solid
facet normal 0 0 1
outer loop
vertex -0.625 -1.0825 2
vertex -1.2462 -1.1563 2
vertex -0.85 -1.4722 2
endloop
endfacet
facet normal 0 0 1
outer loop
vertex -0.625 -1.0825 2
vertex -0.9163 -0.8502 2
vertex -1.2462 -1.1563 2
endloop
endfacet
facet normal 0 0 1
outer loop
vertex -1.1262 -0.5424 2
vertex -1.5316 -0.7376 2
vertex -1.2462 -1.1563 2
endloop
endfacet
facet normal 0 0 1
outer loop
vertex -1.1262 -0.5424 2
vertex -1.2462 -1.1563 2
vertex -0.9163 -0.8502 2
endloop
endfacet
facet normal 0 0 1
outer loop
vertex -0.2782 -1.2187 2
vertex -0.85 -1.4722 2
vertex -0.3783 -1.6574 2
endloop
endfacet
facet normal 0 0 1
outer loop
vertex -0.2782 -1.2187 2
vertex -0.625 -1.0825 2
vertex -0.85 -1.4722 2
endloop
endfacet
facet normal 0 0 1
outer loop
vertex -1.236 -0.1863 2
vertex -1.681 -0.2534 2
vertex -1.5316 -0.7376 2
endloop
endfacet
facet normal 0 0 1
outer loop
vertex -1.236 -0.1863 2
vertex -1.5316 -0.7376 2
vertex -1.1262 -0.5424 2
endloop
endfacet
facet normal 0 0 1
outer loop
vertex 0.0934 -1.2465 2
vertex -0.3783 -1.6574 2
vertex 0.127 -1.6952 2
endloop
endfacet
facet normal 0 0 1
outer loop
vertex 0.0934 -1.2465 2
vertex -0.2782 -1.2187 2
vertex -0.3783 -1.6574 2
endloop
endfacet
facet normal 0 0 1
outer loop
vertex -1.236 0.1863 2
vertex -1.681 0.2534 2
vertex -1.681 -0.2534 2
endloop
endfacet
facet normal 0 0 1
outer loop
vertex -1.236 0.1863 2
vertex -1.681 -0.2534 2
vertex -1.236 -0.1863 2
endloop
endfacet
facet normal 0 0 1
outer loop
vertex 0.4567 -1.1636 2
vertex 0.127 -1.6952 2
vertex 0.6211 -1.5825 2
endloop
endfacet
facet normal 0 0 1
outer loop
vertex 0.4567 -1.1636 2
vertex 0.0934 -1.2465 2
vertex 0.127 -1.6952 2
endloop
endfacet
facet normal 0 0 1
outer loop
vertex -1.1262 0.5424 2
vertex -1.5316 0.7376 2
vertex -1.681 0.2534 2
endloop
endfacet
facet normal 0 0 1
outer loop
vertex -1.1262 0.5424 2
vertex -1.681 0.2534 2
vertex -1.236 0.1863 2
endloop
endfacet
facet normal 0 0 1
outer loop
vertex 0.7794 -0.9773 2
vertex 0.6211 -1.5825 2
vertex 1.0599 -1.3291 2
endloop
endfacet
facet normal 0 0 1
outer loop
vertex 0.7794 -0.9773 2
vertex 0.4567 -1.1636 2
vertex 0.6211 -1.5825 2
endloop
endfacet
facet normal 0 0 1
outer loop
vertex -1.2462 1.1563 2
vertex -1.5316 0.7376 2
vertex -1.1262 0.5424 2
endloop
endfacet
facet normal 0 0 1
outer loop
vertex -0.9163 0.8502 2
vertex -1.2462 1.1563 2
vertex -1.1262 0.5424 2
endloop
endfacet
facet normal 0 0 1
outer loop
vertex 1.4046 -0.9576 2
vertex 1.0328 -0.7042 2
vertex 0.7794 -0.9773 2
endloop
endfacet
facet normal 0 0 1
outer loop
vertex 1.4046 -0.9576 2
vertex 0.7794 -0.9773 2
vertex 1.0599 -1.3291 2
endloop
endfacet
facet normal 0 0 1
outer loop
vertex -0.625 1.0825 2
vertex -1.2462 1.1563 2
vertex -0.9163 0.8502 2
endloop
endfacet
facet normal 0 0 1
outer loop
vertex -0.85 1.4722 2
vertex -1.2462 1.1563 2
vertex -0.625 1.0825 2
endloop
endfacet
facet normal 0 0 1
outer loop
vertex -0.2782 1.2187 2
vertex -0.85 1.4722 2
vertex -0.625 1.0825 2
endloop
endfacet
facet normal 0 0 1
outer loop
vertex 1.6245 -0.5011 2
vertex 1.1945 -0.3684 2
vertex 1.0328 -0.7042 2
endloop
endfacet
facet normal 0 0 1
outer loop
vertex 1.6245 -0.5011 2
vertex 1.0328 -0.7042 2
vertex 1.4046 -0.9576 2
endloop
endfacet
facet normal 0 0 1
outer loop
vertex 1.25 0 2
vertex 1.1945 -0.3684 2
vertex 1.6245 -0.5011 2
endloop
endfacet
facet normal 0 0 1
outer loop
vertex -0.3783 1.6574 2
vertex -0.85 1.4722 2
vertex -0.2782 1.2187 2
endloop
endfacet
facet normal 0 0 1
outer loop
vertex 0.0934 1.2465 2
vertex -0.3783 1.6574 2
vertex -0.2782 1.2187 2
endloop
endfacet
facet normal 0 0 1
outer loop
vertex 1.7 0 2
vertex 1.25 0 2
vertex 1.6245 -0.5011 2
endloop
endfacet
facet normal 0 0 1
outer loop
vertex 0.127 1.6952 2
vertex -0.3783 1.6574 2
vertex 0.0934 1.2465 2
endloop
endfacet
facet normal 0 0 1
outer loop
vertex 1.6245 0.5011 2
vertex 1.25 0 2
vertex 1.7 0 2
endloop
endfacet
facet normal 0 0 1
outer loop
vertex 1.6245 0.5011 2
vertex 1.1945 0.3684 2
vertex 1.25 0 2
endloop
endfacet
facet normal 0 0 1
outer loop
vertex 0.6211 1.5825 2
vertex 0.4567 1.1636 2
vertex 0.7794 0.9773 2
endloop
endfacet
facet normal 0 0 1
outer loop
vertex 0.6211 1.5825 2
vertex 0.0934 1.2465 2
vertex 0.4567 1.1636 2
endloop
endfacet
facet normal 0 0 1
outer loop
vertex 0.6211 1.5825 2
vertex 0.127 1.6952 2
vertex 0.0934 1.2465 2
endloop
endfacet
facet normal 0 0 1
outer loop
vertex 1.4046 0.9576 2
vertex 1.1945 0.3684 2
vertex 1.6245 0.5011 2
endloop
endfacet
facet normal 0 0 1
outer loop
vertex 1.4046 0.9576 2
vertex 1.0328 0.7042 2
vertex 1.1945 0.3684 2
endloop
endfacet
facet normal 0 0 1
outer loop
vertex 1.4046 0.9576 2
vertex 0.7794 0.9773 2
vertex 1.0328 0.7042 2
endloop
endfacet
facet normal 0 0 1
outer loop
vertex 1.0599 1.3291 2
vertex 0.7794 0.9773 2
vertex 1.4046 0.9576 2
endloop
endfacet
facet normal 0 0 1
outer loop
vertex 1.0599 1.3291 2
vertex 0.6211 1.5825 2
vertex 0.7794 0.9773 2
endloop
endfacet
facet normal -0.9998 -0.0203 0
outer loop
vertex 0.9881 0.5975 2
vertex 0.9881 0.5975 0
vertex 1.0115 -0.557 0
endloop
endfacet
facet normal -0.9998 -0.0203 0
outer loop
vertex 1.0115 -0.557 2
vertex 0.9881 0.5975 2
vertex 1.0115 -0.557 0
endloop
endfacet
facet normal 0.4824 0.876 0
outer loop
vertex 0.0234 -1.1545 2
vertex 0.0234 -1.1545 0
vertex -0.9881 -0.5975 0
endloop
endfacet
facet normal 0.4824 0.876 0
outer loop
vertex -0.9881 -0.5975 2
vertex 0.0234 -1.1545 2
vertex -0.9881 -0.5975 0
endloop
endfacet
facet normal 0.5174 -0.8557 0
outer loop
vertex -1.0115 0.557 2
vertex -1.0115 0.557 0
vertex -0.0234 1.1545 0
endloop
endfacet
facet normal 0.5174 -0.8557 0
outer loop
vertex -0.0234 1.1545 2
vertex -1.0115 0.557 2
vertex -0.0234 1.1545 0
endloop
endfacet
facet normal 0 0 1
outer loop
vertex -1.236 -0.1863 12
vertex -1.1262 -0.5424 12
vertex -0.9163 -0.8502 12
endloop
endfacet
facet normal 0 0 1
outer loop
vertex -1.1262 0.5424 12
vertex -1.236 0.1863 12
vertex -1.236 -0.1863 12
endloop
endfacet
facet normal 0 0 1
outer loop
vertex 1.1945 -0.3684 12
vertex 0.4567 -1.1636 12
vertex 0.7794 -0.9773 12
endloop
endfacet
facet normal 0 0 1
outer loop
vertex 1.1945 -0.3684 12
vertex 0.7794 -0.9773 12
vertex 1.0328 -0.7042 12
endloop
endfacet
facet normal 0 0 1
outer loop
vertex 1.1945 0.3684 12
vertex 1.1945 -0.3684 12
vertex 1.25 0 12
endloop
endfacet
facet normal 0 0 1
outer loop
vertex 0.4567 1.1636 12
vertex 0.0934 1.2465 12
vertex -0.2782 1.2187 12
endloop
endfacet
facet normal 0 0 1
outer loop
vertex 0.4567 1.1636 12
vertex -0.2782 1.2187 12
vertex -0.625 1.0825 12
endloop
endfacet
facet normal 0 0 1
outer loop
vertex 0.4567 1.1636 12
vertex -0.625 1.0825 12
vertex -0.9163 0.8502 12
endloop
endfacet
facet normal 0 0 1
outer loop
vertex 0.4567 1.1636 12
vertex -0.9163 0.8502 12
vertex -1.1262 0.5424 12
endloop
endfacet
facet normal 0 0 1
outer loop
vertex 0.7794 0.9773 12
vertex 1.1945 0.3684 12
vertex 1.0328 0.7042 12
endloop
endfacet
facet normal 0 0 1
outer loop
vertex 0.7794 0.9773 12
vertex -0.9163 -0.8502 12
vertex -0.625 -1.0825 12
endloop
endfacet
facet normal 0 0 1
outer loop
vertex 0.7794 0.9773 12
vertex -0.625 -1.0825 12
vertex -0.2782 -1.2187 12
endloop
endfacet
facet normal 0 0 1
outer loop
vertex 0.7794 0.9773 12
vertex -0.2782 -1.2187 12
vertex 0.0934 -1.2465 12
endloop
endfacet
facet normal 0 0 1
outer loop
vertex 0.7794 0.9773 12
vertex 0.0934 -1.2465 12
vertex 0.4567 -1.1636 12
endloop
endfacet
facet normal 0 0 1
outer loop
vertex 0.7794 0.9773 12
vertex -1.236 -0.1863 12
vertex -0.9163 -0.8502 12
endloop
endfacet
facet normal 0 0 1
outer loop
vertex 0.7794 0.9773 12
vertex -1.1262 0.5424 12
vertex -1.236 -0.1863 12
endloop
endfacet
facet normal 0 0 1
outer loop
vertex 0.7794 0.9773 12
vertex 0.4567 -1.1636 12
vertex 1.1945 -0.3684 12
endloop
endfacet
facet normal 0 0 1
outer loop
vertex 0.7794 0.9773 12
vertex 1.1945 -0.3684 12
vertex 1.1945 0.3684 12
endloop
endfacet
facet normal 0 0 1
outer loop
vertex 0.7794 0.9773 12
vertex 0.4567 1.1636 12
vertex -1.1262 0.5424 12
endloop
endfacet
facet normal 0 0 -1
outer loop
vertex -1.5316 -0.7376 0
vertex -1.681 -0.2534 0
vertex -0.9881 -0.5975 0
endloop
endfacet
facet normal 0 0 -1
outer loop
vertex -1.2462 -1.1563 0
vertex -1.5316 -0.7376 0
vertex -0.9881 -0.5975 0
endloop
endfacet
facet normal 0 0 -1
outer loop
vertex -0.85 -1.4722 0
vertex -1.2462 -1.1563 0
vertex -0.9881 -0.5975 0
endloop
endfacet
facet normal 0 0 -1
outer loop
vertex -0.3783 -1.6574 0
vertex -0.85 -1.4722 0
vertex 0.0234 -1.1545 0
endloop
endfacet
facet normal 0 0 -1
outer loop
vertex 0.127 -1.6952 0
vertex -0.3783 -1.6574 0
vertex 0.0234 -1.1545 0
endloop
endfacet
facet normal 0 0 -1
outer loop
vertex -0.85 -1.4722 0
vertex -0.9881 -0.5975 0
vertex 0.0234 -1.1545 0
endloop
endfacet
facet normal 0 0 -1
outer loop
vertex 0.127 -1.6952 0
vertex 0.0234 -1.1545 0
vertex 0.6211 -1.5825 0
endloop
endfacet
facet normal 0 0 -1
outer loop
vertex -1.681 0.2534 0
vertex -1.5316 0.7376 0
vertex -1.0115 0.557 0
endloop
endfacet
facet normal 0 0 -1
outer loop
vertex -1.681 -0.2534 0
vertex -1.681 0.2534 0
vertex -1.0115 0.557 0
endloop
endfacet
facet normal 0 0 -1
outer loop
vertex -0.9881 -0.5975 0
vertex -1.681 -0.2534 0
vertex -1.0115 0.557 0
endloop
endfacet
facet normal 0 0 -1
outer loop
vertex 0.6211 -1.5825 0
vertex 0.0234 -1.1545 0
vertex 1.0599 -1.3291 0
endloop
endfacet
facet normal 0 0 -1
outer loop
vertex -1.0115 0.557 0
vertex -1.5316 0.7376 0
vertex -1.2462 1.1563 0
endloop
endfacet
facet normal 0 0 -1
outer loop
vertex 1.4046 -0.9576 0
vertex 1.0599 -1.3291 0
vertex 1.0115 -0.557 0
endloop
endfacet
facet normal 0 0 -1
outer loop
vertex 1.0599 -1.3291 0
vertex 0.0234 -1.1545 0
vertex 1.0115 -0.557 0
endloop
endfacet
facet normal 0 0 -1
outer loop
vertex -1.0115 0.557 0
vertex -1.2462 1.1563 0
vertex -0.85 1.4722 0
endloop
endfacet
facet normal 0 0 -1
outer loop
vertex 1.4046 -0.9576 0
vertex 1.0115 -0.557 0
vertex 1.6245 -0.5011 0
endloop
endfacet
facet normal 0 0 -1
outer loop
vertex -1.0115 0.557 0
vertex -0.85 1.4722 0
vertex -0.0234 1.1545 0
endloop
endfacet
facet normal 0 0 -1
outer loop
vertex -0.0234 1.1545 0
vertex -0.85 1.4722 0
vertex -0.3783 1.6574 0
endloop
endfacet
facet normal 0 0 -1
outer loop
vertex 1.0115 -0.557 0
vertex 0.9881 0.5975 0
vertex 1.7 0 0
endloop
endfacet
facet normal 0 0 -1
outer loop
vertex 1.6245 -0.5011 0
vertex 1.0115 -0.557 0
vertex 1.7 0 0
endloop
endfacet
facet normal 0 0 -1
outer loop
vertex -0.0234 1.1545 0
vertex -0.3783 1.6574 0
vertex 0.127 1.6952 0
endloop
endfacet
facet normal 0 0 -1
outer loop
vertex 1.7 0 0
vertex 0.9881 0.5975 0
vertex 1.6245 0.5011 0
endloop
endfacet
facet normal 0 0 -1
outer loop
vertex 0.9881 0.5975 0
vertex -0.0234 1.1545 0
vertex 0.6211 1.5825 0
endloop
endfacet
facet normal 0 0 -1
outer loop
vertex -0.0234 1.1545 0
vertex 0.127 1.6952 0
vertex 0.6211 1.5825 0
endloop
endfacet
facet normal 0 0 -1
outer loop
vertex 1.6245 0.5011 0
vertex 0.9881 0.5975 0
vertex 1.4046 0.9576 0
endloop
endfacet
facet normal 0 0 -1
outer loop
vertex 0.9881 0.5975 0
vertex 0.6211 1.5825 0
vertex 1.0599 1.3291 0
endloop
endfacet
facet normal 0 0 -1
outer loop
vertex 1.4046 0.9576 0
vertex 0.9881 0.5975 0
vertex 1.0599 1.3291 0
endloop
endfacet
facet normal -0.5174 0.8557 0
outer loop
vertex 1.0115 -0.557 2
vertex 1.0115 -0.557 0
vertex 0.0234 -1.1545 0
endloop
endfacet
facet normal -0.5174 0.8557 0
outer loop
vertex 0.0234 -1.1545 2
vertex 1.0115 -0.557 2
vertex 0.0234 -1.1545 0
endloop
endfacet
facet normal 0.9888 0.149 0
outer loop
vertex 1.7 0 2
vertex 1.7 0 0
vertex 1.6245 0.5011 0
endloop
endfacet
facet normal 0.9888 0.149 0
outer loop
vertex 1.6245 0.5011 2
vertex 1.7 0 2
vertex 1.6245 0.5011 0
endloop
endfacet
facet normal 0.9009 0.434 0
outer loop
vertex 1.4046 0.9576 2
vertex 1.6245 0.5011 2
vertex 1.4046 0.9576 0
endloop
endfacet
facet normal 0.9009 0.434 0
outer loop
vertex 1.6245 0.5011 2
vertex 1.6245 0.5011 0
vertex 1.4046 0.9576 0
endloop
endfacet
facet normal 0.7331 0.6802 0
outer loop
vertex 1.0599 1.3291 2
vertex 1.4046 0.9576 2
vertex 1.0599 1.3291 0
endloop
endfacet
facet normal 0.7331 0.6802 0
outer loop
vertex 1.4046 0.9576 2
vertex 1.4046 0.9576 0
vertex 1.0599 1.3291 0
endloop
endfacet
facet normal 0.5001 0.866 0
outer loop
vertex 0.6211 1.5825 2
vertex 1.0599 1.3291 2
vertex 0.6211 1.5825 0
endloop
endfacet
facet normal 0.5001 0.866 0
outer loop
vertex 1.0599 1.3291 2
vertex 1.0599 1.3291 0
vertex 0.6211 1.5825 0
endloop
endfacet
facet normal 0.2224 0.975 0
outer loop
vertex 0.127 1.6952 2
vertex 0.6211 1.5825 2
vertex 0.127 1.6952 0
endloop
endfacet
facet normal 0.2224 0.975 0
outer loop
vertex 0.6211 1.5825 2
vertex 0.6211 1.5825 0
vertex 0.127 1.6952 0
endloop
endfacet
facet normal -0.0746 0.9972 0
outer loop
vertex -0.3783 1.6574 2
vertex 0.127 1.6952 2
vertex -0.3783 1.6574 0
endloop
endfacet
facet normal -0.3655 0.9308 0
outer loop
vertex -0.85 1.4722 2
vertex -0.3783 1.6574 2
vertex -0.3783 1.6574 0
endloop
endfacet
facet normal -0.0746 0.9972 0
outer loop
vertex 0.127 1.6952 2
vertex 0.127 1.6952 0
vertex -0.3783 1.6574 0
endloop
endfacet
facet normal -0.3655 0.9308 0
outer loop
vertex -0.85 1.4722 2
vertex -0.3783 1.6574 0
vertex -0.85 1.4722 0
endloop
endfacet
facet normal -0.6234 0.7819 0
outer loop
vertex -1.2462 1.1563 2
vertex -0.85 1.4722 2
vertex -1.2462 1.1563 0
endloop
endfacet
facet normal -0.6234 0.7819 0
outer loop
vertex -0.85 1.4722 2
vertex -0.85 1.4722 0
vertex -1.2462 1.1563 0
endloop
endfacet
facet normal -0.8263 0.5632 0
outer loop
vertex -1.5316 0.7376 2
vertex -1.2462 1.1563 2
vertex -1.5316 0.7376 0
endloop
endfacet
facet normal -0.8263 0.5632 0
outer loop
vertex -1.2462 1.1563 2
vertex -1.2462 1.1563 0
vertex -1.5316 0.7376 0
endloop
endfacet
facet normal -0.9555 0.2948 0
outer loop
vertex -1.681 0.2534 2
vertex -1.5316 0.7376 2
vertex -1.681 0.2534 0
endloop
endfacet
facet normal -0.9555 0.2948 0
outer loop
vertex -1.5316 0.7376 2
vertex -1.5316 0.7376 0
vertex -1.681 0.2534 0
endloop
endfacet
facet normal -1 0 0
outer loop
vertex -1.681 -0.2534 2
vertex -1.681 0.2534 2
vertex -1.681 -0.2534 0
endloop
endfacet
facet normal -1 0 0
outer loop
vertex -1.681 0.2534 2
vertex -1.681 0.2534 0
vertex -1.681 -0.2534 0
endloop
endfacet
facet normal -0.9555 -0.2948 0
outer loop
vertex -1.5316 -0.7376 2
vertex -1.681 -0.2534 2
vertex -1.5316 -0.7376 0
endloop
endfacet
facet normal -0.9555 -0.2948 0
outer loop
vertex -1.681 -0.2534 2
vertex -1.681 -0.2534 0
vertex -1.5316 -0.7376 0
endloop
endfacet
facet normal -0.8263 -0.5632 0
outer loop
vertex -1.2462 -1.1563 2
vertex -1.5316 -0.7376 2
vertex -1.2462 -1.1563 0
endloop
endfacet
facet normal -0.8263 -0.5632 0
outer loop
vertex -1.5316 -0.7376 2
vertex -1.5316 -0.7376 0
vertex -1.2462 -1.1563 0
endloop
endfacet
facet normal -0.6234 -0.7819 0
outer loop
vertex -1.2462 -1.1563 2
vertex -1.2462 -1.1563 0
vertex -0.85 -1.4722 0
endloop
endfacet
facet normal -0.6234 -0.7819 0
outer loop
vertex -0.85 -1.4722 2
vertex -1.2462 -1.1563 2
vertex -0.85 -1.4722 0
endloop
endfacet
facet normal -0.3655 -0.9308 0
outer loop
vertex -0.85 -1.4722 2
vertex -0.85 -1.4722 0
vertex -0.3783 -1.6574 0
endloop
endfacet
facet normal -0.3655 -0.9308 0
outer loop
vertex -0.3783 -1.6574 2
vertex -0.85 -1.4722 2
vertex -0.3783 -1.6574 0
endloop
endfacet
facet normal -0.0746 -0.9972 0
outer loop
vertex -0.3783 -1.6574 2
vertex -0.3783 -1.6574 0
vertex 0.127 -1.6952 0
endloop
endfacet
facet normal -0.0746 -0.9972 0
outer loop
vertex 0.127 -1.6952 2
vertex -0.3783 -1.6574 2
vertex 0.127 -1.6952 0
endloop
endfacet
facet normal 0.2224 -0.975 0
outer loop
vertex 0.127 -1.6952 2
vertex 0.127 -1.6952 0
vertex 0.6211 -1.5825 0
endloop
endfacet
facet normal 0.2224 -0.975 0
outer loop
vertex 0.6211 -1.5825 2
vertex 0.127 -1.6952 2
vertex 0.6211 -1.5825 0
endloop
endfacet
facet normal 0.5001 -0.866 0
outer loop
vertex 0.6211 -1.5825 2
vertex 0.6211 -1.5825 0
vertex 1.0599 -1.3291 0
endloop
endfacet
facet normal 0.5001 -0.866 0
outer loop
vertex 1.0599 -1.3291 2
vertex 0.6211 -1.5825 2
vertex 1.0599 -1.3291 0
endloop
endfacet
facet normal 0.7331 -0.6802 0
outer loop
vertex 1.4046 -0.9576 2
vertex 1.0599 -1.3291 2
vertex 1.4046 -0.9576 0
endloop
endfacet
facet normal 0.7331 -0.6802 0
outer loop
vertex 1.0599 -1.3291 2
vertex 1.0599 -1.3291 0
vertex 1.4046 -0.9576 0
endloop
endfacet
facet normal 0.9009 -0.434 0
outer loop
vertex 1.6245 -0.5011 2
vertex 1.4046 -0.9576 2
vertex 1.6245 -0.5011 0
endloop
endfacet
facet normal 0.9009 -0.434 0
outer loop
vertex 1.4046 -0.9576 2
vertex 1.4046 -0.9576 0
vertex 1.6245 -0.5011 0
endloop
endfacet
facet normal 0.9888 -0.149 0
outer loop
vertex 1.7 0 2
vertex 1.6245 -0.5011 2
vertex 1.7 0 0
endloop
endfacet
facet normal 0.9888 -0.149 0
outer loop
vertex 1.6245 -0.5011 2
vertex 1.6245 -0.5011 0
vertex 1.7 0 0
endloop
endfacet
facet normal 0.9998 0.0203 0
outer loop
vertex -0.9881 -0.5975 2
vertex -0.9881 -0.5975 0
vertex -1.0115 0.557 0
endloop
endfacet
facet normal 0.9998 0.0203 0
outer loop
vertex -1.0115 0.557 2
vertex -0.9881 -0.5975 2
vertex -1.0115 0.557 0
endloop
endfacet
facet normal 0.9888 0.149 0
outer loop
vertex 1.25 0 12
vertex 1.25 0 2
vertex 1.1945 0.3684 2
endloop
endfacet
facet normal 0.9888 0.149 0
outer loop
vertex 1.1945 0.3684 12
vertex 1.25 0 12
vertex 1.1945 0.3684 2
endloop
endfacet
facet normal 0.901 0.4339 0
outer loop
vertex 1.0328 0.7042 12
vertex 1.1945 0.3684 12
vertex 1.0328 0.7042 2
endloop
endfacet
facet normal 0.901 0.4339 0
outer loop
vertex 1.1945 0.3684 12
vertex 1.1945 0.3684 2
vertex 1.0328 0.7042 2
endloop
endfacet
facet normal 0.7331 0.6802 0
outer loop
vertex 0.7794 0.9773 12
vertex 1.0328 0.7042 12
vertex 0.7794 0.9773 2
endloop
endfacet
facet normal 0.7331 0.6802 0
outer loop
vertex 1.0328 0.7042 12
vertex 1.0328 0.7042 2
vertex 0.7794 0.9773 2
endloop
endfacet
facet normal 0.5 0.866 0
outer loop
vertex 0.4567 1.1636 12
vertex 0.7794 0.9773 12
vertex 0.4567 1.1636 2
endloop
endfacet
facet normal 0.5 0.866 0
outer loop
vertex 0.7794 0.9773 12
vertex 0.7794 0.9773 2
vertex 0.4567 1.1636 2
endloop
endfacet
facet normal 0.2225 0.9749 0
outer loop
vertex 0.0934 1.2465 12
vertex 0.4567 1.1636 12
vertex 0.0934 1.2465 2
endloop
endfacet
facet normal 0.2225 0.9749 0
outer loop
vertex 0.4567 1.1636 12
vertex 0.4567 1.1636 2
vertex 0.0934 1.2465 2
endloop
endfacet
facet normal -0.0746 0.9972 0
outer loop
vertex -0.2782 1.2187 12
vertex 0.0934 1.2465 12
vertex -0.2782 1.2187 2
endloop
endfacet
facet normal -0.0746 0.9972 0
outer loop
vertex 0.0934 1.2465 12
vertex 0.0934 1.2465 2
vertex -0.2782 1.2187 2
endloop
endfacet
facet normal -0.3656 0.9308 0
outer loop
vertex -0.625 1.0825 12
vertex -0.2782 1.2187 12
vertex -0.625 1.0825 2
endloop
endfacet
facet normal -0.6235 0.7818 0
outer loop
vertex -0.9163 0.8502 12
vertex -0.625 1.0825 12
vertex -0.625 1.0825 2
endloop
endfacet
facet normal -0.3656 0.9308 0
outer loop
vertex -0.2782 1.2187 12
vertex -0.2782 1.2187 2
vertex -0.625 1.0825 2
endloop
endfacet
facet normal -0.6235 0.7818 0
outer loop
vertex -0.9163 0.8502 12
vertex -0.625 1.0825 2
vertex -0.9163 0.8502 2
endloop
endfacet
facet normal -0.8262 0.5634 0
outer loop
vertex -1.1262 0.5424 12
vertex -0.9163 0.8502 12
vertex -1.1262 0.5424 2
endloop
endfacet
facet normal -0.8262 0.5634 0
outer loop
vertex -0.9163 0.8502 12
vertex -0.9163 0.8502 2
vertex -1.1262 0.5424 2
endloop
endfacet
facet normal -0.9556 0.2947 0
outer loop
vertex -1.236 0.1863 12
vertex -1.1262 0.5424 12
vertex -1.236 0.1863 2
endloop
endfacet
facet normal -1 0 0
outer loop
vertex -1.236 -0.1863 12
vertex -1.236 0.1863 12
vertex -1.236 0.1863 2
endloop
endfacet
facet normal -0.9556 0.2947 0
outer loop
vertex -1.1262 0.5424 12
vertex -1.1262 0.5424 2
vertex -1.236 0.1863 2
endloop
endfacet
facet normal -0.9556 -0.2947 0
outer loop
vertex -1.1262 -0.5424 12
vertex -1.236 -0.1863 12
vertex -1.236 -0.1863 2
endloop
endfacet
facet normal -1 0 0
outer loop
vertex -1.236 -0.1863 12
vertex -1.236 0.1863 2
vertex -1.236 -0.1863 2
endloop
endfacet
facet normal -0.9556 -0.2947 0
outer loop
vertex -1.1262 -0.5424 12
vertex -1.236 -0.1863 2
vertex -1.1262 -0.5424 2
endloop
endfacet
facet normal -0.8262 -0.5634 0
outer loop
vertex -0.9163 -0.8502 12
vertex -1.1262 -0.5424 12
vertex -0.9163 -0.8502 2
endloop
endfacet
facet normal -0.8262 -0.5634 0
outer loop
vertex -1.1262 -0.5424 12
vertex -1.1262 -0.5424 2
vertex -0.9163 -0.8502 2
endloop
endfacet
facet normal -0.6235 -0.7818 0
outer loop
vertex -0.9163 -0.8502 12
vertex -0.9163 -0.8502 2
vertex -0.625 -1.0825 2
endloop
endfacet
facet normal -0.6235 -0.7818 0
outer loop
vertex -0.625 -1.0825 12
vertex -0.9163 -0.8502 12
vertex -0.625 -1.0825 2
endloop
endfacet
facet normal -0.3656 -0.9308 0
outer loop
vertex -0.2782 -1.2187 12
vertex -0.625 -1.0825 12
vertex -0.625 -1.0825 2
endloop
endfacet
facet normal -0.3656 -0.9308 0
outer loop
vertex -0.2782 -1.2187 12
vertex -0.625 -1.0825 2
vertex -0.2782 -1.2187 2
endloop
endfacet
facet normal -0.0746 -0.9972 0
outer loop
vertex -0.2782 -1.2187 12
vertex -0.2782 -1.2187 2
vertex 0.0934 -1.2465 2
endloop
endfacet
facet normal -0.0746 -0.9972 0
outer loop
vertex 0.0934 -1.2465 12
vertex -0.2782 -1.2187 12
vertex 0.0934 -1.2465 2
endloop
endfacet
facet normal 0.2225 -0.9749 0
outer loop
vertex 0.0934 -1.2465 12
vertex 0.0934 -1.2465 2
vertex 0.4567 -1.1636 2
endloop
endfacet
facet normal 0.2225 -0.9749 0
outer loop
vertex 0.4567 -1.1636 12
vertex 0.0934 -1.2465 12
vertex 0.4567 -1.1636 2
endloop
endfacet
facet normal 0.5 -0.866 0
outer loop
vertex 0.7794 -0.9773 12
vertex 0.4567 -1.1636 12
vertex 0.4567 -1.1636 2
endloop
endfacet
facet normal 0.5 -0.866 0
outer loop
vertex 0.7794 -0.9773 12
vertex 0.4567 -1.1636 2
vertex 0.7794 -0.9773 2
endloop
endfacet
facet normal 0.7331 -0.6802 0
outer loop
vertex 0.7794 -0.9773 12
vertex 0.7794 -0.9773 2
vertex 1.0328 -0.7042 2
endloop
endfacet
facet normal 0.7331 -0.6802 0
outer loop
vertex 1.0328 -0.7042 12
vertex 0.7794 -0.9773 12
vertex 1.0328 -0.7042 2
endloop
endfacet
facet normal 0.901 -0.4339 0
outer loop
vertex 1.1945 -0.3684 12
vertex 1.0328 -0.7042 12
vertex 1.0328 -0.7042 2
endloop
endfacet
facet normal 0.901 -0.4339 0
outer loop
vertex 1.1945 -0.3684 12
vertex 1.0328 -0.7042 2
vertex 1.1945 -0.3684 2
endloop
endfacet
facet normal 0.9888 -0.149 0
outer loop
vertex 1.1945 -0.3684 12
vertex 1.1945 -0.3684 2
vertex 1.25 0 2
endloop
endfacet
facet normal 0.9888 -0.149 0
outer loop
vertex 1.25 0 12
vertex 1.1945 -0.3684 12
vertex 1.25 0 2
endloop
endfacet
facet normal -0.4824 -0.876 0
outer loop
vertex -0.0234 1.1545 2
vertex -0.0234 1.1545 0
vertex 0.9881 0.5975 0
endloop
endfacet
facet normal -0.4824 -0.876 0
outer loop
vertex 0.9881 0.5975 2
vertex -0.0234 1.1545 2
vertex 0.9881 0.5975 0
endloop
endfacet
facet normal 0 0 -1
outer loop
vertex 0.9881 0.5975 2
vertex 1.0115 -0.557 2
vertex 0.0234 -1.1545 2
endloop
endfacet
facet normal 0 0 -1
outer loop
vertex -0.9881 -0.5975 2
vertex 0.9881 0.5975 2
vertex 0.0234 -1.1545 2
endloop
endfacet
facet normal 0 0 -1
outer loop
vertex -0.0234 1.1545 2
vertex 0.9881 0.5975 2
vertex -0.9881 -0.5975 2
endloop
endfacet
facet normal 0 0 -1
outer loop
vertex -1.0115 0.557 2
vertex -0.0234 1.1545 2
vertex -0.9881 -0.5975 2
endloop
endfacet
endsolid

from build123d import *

# Parameters (mm, degrees)
SKETCH1_R           = 1.25
BOSS_EXTRUDE1_DEPTH = 12
SKETCH1_3_R         = 1.7
SKETCH1_3_R_2       = 1.25
BOSS_EXTRUDE2_DEPTH = 2
CUT_EXTRUDE1_DEPTH  = 2


with BuildPart() as part:
    # Sketch1 → Boss-Extrude1 (new body)
    with BuildSketch(Plane.XY):
        Circle(SKETCH1_R)
    extrude(amount=BOSS_EXTRUDE1_DEPTH)

    # Sketch1<3> → Boss-Extrude2 (add)
    with BuildSketch(Plane.XY):
        Circle(SKETCH1_3_R)
        Circle(SKETCH1_3_R_2, mode=Mode.SUBTRACT)
    extrude(amount=BOSS_EXTRUDE2_DEPTH)

    # Sketch3 → Cut-Extrude1 (cut)
    with BuildSketch(Plane(origin=(0, 0, 0), x_dir=(-1, 0, 0), z_dir=(0, 0, -1))):
        Polygon((0.988114182, -0.597464389), (1.01147643, 0.556999789), (0.023362248, 1.154464178), (-0.988114182, 0.597464389), (-1.01147643, -0.556999789), (-0.023362248, -1.154464178), align=None)
    extrude(amount=-CUT_EXTRUDE1_DEPTH, mode=Mode.SUBTRACT)


solid = part.part
